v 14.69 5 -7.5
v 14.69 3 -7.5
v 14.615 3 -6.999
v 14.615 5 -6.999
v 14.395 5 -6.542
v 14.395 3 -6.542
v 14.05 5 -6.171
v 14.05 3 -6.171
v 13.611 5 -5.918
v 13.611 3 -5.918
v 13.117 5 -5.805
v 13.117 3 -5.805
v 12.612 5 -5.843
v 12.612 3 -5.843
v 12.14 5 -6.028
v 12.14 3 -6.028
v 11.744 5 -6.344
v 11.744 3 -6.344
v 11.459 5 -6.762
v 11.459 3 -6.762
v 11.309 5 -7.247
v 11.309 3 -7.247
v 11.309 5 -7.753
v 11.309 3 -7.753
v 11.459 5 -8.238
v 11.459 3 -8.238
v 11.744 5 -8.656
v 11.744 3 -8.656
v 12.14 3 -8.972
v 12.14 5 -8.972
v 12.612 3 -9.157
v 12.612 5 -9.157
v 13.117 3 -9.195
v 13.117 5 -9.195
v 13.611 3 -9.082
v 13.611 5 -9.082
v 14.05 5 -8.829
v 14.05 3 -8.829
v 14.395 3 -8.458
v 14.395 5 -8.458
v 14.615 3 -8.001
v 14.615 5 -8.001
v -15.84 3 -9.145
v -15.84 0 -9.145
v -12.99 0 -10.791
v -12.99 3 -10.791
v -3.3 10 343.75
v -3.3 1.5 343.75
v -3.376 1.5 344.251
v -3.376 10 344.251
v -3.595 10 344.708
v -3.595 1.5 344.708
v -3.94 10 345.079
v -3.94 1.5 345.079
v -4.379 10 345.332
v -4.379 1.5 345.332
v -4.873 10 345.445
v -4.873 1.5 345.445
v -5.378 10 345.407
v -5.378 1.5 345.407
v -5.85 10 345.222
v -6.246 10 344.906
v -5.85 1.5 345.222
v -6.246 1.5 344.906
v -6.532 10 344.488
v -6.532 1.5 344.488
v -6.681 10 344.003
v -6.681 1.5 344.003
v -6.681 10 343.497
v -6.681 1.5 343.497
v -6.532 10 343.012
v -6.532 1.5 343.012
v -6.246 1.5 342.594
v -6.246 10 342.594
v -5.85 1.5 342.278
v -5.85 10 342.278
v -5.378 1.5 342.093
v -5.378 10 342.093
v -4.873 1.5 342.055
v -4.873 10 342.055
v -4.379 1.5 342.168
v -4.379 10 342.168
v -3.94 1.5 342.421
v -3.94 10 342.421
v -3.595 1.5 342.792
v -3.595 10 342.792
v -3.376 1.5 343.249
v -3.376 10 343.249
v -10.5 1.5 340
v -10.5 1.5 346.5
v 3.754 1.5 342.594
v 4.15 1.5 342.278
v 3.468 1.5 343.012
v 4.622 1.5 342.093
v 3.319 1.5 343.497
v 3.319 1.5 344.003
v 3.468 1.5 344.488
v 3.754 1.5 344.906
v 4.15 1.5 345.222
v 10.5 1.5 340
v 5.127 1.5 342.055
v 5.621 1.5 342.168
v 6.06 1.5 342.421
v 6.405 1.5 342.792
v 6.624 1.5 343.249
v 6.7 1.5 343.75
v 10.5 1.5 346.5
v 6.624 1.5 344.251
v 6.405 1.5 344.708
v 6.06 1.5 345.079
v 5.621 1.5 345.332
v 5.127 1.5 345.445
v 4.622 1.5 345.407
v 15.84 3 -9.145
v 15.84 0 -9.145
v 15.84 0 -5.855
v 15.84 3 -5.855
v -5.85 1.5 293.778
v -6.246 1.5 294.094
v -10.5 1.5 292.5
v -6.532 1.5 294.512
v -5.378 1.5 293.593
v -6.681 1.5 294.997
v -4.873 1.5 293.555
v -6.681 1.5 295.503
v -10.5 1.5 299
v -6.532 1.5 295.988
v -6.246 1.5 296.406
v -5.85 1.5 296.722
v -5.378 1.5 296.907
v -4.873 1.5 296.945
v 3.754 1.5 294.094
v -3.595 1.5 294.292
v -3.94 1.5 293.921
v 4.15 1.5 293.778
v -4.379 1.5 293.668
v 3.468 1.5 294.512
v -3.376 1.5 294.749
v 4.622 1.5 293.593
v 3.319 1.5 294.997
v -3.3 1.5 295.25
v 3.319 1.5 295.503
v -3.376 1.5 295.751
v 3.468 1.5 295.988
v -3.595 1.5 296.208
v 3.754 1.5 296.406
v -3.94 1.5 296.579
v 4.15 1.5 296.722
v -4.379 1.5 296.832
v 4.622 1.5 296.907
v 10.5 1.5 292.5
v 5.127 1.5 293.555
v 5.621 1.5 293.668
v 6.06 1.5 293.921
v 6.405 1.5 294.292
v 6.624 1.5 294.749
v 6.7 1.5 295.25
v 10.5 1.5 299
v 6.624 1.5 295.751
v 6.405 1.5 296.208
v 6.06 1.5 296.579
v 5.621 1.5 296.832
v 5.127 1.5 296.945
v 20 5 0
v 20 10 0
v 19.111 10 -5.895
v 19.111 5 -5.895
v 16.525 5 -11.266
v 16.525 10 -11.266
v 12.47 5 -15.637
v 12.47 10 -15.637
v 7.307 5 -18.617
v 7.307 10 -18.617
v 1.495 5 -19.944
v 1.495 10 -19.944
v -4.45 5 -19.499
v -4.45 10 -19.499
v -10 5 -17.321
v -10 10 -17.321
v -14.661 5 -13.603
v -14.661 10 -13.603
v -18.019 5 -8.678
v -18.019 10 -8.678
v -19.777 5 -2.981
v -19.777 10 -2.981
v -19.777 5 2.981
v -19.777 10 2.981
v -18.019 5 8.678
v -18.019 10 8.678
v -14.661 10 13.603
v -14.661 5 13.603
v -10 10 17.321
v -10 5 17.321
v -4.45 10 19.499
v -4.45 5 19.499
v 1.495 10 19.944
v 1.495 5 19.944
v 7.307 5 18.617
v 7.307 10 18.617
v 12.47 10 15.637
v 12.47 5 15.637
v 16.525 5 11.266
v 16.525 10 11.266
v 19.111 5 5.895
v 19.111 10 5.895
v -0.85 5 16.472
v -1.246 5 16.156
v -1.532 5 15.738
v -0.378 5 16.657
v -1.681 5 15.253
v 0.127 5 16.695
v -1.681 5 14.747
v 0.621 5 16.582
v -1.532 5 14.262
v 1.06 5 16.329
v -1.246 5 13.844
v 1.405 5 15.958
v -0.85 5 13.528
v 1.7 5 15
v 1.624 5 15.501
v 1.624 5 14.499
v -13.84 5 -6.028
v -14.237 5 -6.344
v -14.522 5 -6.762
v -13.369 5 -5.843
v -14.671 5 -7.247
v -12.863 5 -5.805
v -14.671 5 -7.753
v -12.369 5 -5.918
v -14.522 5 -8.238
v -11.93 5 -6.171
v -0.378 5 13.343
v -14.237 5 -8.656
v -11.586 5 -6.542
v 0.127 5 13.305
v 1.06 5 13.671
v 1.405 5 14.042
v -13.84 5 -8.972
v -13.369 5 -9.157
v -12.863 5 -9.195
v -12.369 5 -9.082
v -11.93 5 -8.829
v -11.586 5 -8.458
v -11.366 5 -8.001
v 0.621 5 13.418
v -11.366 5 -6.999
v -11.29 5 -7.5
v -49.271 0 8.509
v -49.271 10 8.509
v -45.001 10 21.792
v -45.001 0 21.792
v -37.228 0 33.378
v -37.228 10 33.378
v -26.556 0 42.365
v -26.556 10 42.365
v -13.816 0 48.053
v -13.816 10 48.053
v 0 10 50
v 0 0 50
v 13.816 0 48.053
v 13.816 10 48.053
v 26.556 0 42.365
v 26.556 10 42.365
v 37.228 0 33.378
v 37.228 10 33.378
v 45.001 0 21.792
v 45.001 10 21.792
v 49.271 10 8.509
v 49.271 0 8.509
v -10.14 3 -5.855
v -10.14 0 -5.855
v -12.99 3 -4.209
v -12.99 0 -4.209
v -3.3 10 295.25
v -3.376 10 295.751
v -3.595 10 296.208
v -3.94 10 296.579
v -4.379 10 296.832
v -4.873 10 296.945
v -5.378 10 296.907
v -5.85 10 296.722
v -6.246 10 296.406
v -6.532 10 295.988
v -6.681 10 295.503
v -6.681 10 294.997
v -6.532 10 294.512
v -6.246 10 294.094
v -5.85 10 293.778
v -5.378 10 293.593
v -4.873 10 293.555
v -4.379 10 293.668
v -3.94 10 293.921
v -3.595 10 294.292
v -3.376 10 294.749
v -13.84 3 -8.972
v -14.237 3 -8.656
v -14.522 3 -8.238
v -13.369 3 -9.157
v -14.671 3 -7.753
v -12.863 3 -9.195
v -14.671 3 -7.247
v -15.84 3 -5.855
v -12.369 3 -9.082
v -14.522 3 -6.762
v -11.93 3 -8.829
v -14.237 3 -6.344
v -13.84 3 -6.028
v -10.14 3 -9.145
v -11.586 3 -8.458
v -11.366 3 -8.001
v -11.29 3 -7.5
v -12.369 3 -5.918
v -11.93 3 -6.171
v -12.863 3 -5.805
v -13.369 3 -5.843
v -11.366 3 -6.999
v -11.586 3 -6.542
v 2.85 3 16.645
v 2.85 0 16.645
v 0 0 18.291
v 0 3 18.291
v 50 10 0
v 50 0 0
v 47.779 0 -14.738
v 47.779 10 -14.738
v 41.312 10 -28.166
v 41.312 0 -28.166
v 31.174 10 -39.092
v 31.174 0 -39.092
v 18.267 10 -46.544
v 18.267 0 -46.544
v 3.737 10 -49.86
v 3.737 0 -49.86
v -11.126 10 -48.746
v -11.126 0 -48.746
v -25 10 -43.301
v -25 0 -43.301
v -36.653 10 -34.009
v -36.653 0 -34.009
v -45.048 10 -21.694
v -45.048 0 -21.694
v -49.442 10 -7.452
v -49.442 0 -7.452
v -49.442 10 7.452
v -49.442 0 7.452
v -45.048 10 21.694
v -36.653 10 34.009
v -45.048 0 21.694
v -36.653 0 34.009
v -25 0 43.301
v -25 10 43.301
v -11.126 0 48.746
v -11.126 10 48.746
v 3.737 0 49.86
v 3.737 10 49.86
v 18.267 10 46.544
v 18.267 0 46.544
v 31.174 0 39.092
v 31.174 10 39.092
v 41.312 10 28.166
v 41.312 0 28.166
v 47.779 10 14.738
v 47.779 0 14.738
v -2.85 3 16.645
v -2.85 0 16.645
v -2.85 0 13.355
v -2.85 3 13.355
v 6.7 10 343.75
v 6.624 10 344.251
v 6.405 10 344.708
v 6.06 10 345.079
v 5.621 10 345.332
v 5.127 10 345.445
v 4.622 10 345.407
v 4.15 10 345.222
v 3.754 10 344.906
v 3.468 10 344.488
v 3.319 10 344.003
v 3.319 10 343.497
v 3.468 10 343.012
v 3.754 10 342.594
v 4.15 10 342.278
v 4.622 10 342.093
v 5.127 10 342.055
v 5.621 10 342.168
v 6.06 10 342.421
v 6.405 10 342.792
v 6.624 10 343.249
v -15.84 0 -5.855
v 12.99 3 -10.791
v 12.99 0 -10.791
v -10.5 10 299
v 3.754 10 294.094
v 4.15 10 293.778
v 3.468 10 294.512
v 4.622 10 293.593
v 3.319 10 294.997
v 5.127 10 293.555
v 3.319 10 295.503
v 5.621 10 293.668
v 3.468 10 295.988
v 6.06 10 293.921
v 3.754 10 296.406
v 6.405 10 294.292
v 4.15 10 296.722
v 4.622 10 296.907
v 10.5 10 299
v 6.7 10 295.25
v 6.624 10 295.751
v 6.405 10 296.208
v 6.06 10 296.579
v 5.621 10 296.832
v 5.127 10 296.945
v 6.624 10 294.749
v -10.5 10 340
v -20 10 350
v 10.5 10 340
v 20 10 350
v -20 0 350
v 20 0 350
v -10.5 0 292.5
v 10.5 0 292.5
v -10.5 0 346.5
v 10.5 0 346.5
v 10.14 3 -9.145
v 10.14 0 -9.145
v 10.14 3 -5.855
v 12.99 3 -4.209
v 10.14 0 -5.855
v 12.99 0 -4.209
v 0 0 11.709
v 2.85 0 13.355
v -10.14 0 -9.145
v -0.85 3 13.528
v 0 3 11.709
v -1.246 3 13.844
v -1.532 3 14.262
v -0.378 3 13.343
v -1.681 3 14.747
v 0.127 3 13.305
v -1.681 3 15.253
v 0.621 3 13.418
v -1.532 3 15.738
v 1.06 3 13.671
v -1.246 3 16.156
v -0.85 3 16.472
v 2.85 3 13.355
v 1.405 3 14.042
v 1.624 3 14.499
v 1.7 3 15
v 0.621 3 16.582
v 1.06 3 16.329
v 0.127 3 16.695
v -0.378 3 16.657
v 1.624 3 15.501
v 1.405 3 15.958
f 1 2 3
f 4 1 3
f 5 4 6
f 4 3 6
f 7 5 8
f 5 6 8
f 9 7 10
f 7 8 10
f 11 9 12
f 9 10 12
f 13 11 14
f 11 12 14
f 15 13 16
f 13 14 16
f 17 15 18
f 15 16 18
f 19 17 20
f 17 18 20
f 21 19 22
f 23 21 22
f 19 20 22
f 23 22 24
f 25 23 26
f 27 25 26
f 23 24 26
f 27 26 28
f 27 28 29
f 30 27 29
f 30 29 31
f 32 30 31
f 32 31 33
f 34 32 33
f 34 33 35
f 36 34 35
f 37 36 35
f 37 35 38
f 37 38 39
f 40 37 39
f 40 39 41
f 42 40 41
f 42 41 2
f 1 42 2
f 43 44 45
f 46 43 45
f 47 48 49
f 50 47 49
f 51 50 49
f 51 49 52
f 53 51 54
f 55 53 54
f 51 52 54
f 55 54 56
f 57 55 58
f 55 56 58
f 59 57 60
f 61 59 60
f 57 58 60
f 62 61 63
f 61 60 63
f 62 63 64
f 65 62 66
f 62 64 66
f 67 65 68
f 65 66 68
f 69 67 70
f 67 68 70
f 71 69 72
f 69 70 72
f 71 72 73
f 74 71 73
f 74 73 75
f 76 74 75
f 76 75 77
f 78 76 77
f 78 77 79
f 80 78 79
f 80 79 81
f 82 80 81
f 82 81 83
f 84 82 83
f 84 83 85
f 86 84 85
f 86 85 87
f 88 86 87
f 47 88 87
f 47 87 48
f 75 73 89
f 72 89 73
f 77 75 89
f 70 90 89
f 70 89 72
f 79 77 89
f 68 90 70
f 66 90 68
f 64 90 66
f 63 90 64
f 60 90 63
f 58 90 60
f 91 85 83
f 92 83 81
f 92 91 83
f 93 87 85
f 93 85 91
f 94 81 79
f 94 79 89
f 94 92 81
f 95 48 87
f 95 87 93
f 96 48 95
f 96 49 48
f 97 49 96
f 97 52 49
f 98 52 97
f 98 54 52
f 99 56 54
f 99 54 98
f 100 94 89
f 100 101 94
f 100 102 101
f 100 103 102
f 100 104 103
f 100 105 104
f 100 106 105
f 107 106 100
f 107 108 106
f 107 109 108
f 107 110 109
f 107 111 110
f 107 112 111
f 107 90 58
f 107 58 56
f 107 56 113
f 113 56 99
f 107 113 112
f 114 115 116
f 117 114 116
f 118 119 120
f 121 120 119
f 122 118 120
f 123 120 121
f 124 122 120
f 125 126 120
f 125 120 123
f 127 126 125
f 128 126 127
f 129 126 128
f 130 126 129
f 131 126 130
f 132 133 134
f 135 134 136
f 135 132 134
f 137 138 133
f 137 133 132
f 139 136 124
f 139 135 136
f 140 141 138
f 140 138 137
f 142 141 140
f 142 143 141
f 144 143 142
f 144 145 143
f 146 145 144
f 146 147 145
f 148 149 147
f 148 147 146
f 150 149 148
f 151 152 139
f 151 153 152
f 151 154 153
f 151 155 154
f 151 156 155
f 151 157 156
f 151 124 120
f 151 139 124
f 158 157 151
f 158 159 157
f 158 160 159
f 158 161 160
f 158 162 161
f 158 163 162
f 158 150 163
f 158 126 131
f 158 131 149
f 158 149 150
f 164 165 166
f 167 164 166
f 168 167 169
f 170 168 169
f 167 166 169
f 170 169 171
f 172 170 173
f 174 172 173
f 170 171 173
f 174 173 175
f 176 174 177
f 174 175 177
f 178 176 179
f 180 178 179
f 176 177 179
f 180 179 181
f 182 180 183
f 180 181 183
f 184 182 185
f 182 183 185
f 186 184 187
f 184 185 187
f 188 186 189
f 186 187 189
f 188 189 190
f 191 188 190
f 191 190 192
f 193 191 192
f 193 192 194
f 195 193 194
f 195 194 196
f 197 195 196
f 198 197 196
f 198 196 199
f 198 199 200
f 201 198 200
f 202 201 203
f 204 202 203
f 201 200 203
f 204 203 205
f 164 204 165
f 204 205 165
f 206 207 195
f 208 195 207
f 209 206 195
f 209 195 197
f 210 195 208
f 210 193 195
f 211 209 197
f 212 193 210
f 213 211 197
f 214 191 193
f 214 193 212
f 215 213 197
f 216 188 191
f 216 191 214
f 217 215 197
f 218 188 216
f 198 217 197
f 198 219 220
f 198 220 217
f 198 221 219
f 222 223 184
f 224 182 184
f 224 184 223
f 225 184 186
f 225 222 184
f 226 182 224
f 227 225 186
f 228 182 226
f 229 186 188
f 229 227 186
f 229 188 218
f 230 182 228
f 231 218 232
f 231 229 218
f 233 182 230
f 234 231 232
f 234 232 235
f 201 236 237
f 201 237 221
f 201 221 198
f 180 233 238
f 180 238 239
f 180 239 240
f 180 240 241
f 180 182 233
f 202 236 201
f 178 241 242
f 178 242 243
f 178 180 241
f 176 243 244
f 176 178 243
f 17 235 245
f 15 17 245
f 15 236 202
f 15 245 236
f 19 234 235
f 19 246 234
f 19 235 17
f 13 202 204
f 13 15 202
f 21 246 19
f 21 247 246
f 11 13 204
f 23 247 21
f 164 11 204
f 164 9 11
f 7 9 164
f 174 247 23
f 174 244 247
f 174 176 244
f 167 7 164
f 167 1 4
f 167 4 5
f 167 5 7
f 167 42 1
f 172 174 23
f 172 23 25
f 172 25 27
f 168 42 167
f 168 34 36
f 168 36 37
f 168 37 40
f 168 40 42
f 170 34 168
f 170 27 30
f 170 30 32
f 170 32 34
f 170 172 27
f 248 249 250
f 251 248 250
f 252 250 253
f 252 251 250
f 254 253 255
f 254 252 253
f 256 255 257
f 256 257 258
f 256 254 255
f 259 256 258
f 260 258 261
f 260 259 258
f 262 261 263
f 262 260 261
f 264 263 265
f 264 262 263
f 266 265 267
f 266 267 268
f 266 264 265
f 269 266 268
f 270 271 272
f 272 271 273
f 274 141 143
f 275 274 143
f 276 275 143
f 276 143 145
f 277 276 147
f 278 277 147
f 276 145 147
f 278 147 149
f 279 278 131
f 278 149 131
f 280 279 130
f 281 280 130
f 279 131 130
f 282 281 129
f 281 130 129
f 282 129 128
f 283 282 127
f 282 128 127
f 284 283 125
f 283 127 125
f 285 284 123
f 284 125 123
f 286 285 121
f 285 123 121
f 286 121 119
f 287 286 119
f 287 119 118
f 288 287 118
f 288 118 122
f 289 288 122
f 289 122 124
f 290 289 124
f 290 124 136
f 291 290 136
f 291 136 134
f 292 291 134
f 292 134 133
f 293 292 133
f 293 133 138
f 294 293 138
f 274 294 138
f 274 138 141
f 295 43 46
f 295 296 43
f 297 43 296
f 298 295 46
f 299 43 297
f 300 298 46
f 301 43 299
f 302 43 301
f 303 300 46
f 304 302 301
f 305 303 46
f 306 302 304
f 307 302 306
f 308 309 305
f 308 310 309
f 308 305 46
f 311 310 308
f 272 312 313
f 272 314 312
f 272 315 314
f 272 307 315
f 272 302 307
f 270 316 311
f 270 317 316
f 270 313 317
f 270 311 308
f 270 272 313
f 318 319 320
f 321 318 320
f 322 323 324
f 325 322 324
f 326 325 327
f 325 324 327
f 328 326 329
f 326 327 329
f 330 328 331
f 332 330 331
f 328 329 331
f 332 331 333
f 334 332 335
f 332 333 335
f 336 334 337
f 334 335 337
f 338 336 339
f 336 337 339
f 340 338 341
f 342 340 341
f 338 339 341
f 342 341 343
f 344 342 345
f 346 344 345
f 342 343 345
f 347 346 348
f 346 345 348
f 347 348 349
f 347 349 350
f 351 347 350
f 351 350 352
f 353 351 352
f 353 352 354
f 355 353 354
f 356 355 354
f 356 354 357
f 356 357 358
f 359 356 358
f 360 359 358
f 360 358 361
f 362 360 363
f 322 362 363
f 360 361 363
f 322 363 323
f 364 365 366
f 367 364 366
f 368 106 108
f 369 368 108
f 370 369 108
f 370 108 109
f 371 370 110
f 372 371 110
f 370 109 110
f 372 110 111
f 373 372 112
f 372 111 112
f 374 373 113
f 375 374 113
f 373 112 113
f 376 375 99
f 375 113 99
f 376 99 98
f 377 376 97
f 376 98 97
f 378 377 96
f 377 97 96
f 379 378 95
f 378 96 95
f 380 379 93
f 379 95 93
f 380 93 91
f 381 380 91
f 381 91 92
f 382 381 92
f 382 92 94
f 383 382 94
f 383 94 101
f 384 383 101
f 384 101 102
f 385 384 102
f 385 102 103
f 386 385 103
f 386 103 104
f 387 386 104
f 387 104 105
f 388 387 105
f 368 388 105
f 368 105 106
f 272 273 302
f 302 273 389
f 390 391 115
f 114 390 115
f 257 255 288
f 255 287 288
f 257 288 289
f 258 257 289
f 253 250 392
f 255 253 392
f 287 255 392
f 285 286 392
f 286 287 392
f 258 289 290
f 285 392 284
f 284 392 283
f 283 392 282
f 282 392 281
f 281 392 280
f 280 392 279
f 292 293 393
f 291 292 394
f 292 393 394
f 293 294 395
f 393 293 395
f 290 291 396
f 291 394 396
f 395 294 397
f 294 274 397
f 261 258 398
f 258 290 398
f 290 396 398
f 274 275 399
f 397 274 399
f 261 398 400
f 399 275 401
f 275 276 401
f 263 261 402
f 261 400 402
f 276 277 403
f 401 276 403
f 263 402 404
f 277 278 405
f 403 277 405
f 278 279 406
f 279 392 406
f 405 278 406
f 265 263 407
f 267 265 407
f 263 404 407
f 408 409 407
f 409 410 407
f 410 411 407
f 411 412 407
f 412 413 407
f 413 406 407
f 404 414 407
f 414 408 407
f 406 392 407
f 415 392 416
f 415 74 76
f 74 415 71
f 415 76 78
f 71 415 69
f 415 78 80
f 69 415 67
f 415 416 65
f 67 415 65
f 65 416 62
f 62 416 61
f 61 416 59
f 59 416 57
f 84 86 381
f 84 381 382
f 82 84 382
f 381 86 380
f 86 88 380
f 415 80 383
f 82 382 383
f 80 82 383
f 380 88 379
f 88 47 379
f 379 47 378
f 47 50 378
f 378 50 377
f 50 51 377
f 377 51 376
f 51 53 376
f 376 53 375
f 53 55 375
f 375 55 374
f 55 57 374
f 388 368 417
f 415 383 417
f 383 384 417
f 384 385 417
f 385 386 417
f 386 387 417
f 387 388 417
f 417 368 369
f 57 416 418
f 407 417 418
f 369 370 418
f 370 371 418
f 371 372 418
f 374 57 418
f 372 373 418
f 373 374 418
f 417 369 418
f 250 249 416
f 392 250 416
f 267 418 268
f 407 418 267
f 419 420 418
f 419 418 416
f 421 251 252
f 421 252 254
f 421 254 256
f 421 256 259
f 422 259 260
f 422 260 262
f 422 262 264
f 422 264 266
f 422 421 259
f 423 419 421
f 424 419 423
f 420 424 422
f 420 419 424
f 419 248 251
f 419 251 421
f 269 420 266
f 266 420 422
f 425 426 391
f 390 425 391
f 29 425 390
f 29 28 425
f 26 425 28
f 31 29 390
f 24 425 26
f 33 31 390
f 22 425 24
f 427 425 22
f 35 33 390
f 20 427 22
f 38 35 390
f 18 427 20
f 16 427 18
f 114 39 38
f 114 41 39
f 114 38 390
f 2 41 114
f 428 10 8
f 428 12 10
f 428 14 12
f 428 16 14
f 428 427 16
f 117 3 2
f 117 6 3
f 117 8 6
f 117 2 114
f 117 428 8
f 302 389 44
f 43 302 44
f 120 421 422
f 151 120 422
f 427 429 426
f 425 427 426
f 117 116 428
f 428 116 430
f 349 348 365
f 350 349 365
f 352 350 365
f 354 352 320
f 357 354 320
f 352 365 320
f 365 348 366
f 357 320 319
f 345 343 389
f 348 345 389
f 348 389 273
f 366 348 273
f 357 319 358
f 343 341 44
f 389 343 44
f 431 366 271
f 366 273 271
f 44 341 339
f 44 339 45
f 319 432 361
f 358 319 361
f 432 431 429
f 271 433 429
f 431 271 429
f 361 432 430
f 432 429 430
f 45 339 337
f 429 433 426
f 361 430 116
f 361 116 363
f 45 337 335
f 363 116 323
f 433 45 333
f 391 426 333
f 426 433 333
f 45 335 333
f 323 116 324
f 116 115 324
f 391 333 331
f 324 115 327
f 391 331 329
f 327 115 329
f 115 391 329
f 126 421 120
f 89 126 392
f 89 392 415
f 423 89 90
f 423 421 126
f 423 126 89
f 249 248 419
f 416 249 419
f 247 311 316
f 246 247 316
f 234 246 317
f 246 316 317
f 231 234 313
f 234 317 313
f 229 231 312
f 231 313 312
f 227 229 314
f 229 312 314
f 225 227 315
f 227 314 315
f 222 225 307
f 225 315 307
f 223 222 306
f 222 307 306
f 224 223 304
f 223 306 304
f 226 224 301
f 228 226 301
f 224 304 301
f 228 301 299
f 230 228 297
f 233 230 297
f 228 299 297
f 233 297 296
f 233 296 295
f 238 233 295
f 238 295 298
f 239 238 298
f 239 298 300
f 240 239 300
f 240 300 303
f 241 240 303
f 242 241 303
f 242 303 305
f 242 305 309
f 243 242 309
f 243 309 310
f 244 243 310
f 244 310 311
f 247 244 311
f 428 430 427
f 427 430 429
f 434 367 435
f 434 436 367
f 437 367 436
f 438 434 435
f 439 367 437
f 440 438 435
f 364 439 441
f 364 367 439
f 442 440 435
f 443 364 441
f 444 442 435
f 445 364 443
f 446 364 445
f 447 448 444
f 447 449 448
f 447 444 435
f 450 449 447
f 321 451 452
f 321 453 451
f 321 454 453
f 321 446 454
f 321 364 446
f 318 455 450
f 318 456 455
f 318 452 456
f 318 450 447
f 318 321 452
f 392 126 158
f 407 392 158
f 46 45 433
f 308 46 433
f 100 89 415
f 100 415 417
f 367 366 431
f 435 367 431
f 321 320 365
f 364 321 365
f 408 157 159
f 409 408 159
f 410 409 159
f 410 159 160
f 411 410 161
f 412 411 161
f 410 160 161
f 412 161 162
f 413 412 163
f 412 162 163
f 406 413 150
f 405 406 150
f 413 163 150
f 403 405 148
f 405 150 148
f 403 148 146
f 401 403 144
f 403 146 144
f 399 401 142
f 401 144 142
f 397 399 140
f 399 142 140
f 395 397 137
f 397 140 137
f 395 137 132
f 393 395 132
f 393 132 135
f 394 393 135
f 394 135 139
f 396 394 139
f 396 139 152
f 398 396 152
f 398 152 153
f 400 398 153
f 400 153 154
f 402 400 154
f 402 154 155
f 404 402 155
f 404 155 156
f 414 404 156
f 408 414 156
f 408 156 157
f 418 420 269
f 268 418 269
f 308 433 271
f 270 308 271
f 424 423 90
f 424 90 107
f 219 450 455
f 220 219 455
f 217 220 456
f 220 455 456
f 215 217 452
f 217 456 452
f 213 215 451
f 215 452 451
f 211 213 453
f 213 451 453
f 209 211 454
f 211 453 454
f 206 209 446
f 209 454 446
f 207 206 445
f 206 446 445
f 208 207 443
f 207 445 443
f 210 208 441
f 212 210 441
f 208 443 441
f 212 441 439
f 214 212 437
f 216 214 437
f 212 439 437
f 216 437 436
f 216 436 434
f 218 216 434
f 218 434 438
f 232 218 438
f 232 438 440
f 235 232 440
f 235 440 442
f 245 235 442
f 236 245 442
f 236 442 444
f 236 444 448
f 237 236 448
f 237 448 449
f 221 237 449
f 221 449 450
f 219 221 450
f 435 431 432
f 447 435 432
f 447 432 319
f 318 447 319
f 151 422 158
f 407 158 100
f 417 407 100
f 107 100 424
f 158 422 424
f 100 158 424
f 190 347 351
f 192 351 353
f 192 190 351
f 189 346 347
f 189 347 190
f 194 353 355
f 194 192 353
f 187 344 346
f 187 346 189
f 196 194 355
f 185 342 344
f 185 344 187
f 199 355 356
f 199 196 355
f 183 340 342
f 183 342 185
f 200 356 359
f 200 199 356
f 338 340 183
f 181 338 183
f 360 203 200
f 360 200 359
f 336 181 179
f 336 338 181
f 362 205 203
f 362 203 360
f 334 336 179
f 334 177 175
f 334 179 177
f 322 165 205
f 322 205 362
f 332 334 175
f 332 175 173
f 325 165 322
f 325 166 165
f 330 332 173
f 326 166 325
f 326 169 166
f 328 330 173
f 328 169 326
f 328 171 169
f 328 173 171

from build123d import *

# Parameters (mm, degrees)
SKETCH1_R           = 50
BOSS_EXTRUDE1_DEPTH = 10
SKETCH2_R           = 20
CUT_EXTRUDE1_DEPTH  = 5
CUT_EXTRUDE6_DEPTH  = 3
SKETCH8_R           = 1.7
CUT_EXTRUDE7_DEPTH  = 10
BOSS_EXTRUDE3_DEPTH = 10
SKETCH10_W          = 21
SKETCH10_H          = 41
CUT_EXTRUDE8_DEPTH  = 10
SKETCH11_W          = 21
SKETCH11_H          = 6.5
CUT_EXTRUDE9_DEPTH  = 1.5
SKETCH12_R          = 1.7
CUT_EXTRUDE10_DEPTH = 9
CUT_EXTRUDE11_DEPTH = 10


with BuildPart() as part:
    # Sketch1 → Boss-Extrude1 (new body)
    with BuildSketch(Plane(origin=(0, 0, 0), x_dir=(1, 0, 0), z_dir=(0, 1, 0))):
        Circle(SKETCH1_R)
    extrude(amount=BOSS_EXTRUDE1_DEPTH)

    # Sketch2 → Cut-Extrude1 (cut)
    with BuildSketch(Plane(origin=(0, 10, 0), x_dir=(1, 0, 0), z_dir=(0, 1, 0))):
        Circle(SKETCH2_R)
    extrude(amount=-CUT_EXTRUDE1_DEPTH, mode=Mode.SUBTRACT)

    # Sketch7 → Cut-Extrude6 (cut)
    with BuildSketch(Plane.XZ):
        with BuildLine():
            ThreePointArc((-2.85, 14.726761355), (0, 15), (2.85, 14.726761355))
            Line((2.85, 14.726761355), (2.85, 16.645448267))
            Line((2.85, 16.645448267), (0, 18.290896534))
            Line((0, 18.290896534), (-2.85, 16.645448267))
            Line((-2.85, 16.645448267), (-2.85, 14.726761355))
        make_face()
        with BuildLine():
            Line((2.85, 13.354551733), (2.85, 14.726761355))
            ThreePointArc((2.85, 14.726761355), (0, 15), (-2.85, 14.726761355))
            Line((-2.85, 14.726761355), (-2.85, 13.354551733))
            Line((-2.85, 13.354551733), (0, 11.709103466))
            Line((0, 11.709103466), (2.85, 13.354551733))
        make_face()
        Polygon((-12.990381057, -4.209103466), (-15.840381057, -5.854551733), (-15.840381057, -9.145448267), (-12.990381057, -10.790896534), (-10.140381057, -9.145448267), (-10.140381057, -5.854551733), align=None)
        Polygon((15.840381057, -5.854551733), (12.990381057, -4.209103466), (10.140381057, -5.854551733), (10.140381057, -9.145448267), (12.990381057, -10.790896534), (15.840381057, -9.145448267), align=None)
    extrude(amount=-CUT_EXTRUDE6_DEPTH, mode=Mode.SUBTRACT)

    # Sketch8 → Cut-Extrude7 (cut)
    with BuildSketch(Plane.XZ):
        with Locations((0, 15)):
            Circle(SKETCH8_R)
        with Locations((12.990381057, -7.5)):
            Circle(SKETCH8_R)
        with Locations((-12.990381057, -7.5)):
            Circle(SKETCH8_R)
    extrude(amount=-CUT_EXTRUDE7_DEPTH, mode=Mode.SUBTRACT)


with BuildPart() as body_2:
    # Sketch9 → Boss-Extrude3 (new body)
    with BuildSketch(Plane.XZ):
        with BuildLine():
            Line((-50, 350), (-50, 0))
            ThreePointArc((-50, 0), (0, 50), (50, 0))
            Line((50, 0), (50, 350))
            Line((50, 350), (-50, 350))
        make_face()
    extrude(amount=-BOSS_EXTRUDE3_DEPTH)

    # Sketch10 → Cut-Extrude8 (cut)
    with BuildSketch(Plane.XZ):
        with Locations((0, 319.5)):
            Rectangle(SKETCH10_W, SKETCH10_H)
    extrude(amount=-CUT_EXTRUDE8_DEPTH, mode=Mode.SUBTRACT)

    # Sketch11 → Cut-Extrude9 (cut)
    with BuildSketch(Plane.XZ):
        with Locations((0, 343.25)):
            Rectangle(SKETCH11_W, SKETCH11_H)
        with Locations((0, 295.75)):
            Rectangle(SKETCH11_W, SKETCH11_H)
    extrude(amount=-CUT_EXTRUDE9_DEPTH, mode=Mode.SUBTRACT)

    # Sketch12 → Cut-Extrude10 (cut)
    with BuildSketch(Plane.XZ.offset(-1.5)):
        with Locations((-5, 343.75)):
            Circle(SKETCH12_R)
        with Locations((5, 343.75)):
            Circle(SKETCH12_R)
        with Locations((-5, 295.25)):
            Circle(SKETCH12_R)
        with Locations((5, 295.25)):
            Circle(SKETCH12_R)
    extrude(amount=-CUT_EXTRUDE10_DEPTH, mode=Mode.SUBTRACT)

    # Sketch13 → Cut-Extrude11 (cut)
    with BuildSketch(Plane.XZ):
        with BuildLine():
            Line((-50, 350), (-50, 0))
            ThreePointArc((-50, 0), (-49.817332452, 4.270057067), (-49.270664506, 8.5089141))
            Line((-49.270664506, 8.5089141), (-20, 350))
            Line((-20, 350), (-50, 350))
        make_face()
        with BuildLine():
            Line((20, 350), (49.270664506, 8.5089141))
            ThreePointArc((49.270664506, 8.5089141), (49.817332452, 4.270057067), (50, 0))
            Line((50, 0), (50, 350))
            Line((50, 350), (20, 350))
        make_face()
    extrude(amount=-CUT_EXTRUDE11_DEPTH, mode=Mode.SUBTRACT)


solid = Compound([part.part, body_2.part])
